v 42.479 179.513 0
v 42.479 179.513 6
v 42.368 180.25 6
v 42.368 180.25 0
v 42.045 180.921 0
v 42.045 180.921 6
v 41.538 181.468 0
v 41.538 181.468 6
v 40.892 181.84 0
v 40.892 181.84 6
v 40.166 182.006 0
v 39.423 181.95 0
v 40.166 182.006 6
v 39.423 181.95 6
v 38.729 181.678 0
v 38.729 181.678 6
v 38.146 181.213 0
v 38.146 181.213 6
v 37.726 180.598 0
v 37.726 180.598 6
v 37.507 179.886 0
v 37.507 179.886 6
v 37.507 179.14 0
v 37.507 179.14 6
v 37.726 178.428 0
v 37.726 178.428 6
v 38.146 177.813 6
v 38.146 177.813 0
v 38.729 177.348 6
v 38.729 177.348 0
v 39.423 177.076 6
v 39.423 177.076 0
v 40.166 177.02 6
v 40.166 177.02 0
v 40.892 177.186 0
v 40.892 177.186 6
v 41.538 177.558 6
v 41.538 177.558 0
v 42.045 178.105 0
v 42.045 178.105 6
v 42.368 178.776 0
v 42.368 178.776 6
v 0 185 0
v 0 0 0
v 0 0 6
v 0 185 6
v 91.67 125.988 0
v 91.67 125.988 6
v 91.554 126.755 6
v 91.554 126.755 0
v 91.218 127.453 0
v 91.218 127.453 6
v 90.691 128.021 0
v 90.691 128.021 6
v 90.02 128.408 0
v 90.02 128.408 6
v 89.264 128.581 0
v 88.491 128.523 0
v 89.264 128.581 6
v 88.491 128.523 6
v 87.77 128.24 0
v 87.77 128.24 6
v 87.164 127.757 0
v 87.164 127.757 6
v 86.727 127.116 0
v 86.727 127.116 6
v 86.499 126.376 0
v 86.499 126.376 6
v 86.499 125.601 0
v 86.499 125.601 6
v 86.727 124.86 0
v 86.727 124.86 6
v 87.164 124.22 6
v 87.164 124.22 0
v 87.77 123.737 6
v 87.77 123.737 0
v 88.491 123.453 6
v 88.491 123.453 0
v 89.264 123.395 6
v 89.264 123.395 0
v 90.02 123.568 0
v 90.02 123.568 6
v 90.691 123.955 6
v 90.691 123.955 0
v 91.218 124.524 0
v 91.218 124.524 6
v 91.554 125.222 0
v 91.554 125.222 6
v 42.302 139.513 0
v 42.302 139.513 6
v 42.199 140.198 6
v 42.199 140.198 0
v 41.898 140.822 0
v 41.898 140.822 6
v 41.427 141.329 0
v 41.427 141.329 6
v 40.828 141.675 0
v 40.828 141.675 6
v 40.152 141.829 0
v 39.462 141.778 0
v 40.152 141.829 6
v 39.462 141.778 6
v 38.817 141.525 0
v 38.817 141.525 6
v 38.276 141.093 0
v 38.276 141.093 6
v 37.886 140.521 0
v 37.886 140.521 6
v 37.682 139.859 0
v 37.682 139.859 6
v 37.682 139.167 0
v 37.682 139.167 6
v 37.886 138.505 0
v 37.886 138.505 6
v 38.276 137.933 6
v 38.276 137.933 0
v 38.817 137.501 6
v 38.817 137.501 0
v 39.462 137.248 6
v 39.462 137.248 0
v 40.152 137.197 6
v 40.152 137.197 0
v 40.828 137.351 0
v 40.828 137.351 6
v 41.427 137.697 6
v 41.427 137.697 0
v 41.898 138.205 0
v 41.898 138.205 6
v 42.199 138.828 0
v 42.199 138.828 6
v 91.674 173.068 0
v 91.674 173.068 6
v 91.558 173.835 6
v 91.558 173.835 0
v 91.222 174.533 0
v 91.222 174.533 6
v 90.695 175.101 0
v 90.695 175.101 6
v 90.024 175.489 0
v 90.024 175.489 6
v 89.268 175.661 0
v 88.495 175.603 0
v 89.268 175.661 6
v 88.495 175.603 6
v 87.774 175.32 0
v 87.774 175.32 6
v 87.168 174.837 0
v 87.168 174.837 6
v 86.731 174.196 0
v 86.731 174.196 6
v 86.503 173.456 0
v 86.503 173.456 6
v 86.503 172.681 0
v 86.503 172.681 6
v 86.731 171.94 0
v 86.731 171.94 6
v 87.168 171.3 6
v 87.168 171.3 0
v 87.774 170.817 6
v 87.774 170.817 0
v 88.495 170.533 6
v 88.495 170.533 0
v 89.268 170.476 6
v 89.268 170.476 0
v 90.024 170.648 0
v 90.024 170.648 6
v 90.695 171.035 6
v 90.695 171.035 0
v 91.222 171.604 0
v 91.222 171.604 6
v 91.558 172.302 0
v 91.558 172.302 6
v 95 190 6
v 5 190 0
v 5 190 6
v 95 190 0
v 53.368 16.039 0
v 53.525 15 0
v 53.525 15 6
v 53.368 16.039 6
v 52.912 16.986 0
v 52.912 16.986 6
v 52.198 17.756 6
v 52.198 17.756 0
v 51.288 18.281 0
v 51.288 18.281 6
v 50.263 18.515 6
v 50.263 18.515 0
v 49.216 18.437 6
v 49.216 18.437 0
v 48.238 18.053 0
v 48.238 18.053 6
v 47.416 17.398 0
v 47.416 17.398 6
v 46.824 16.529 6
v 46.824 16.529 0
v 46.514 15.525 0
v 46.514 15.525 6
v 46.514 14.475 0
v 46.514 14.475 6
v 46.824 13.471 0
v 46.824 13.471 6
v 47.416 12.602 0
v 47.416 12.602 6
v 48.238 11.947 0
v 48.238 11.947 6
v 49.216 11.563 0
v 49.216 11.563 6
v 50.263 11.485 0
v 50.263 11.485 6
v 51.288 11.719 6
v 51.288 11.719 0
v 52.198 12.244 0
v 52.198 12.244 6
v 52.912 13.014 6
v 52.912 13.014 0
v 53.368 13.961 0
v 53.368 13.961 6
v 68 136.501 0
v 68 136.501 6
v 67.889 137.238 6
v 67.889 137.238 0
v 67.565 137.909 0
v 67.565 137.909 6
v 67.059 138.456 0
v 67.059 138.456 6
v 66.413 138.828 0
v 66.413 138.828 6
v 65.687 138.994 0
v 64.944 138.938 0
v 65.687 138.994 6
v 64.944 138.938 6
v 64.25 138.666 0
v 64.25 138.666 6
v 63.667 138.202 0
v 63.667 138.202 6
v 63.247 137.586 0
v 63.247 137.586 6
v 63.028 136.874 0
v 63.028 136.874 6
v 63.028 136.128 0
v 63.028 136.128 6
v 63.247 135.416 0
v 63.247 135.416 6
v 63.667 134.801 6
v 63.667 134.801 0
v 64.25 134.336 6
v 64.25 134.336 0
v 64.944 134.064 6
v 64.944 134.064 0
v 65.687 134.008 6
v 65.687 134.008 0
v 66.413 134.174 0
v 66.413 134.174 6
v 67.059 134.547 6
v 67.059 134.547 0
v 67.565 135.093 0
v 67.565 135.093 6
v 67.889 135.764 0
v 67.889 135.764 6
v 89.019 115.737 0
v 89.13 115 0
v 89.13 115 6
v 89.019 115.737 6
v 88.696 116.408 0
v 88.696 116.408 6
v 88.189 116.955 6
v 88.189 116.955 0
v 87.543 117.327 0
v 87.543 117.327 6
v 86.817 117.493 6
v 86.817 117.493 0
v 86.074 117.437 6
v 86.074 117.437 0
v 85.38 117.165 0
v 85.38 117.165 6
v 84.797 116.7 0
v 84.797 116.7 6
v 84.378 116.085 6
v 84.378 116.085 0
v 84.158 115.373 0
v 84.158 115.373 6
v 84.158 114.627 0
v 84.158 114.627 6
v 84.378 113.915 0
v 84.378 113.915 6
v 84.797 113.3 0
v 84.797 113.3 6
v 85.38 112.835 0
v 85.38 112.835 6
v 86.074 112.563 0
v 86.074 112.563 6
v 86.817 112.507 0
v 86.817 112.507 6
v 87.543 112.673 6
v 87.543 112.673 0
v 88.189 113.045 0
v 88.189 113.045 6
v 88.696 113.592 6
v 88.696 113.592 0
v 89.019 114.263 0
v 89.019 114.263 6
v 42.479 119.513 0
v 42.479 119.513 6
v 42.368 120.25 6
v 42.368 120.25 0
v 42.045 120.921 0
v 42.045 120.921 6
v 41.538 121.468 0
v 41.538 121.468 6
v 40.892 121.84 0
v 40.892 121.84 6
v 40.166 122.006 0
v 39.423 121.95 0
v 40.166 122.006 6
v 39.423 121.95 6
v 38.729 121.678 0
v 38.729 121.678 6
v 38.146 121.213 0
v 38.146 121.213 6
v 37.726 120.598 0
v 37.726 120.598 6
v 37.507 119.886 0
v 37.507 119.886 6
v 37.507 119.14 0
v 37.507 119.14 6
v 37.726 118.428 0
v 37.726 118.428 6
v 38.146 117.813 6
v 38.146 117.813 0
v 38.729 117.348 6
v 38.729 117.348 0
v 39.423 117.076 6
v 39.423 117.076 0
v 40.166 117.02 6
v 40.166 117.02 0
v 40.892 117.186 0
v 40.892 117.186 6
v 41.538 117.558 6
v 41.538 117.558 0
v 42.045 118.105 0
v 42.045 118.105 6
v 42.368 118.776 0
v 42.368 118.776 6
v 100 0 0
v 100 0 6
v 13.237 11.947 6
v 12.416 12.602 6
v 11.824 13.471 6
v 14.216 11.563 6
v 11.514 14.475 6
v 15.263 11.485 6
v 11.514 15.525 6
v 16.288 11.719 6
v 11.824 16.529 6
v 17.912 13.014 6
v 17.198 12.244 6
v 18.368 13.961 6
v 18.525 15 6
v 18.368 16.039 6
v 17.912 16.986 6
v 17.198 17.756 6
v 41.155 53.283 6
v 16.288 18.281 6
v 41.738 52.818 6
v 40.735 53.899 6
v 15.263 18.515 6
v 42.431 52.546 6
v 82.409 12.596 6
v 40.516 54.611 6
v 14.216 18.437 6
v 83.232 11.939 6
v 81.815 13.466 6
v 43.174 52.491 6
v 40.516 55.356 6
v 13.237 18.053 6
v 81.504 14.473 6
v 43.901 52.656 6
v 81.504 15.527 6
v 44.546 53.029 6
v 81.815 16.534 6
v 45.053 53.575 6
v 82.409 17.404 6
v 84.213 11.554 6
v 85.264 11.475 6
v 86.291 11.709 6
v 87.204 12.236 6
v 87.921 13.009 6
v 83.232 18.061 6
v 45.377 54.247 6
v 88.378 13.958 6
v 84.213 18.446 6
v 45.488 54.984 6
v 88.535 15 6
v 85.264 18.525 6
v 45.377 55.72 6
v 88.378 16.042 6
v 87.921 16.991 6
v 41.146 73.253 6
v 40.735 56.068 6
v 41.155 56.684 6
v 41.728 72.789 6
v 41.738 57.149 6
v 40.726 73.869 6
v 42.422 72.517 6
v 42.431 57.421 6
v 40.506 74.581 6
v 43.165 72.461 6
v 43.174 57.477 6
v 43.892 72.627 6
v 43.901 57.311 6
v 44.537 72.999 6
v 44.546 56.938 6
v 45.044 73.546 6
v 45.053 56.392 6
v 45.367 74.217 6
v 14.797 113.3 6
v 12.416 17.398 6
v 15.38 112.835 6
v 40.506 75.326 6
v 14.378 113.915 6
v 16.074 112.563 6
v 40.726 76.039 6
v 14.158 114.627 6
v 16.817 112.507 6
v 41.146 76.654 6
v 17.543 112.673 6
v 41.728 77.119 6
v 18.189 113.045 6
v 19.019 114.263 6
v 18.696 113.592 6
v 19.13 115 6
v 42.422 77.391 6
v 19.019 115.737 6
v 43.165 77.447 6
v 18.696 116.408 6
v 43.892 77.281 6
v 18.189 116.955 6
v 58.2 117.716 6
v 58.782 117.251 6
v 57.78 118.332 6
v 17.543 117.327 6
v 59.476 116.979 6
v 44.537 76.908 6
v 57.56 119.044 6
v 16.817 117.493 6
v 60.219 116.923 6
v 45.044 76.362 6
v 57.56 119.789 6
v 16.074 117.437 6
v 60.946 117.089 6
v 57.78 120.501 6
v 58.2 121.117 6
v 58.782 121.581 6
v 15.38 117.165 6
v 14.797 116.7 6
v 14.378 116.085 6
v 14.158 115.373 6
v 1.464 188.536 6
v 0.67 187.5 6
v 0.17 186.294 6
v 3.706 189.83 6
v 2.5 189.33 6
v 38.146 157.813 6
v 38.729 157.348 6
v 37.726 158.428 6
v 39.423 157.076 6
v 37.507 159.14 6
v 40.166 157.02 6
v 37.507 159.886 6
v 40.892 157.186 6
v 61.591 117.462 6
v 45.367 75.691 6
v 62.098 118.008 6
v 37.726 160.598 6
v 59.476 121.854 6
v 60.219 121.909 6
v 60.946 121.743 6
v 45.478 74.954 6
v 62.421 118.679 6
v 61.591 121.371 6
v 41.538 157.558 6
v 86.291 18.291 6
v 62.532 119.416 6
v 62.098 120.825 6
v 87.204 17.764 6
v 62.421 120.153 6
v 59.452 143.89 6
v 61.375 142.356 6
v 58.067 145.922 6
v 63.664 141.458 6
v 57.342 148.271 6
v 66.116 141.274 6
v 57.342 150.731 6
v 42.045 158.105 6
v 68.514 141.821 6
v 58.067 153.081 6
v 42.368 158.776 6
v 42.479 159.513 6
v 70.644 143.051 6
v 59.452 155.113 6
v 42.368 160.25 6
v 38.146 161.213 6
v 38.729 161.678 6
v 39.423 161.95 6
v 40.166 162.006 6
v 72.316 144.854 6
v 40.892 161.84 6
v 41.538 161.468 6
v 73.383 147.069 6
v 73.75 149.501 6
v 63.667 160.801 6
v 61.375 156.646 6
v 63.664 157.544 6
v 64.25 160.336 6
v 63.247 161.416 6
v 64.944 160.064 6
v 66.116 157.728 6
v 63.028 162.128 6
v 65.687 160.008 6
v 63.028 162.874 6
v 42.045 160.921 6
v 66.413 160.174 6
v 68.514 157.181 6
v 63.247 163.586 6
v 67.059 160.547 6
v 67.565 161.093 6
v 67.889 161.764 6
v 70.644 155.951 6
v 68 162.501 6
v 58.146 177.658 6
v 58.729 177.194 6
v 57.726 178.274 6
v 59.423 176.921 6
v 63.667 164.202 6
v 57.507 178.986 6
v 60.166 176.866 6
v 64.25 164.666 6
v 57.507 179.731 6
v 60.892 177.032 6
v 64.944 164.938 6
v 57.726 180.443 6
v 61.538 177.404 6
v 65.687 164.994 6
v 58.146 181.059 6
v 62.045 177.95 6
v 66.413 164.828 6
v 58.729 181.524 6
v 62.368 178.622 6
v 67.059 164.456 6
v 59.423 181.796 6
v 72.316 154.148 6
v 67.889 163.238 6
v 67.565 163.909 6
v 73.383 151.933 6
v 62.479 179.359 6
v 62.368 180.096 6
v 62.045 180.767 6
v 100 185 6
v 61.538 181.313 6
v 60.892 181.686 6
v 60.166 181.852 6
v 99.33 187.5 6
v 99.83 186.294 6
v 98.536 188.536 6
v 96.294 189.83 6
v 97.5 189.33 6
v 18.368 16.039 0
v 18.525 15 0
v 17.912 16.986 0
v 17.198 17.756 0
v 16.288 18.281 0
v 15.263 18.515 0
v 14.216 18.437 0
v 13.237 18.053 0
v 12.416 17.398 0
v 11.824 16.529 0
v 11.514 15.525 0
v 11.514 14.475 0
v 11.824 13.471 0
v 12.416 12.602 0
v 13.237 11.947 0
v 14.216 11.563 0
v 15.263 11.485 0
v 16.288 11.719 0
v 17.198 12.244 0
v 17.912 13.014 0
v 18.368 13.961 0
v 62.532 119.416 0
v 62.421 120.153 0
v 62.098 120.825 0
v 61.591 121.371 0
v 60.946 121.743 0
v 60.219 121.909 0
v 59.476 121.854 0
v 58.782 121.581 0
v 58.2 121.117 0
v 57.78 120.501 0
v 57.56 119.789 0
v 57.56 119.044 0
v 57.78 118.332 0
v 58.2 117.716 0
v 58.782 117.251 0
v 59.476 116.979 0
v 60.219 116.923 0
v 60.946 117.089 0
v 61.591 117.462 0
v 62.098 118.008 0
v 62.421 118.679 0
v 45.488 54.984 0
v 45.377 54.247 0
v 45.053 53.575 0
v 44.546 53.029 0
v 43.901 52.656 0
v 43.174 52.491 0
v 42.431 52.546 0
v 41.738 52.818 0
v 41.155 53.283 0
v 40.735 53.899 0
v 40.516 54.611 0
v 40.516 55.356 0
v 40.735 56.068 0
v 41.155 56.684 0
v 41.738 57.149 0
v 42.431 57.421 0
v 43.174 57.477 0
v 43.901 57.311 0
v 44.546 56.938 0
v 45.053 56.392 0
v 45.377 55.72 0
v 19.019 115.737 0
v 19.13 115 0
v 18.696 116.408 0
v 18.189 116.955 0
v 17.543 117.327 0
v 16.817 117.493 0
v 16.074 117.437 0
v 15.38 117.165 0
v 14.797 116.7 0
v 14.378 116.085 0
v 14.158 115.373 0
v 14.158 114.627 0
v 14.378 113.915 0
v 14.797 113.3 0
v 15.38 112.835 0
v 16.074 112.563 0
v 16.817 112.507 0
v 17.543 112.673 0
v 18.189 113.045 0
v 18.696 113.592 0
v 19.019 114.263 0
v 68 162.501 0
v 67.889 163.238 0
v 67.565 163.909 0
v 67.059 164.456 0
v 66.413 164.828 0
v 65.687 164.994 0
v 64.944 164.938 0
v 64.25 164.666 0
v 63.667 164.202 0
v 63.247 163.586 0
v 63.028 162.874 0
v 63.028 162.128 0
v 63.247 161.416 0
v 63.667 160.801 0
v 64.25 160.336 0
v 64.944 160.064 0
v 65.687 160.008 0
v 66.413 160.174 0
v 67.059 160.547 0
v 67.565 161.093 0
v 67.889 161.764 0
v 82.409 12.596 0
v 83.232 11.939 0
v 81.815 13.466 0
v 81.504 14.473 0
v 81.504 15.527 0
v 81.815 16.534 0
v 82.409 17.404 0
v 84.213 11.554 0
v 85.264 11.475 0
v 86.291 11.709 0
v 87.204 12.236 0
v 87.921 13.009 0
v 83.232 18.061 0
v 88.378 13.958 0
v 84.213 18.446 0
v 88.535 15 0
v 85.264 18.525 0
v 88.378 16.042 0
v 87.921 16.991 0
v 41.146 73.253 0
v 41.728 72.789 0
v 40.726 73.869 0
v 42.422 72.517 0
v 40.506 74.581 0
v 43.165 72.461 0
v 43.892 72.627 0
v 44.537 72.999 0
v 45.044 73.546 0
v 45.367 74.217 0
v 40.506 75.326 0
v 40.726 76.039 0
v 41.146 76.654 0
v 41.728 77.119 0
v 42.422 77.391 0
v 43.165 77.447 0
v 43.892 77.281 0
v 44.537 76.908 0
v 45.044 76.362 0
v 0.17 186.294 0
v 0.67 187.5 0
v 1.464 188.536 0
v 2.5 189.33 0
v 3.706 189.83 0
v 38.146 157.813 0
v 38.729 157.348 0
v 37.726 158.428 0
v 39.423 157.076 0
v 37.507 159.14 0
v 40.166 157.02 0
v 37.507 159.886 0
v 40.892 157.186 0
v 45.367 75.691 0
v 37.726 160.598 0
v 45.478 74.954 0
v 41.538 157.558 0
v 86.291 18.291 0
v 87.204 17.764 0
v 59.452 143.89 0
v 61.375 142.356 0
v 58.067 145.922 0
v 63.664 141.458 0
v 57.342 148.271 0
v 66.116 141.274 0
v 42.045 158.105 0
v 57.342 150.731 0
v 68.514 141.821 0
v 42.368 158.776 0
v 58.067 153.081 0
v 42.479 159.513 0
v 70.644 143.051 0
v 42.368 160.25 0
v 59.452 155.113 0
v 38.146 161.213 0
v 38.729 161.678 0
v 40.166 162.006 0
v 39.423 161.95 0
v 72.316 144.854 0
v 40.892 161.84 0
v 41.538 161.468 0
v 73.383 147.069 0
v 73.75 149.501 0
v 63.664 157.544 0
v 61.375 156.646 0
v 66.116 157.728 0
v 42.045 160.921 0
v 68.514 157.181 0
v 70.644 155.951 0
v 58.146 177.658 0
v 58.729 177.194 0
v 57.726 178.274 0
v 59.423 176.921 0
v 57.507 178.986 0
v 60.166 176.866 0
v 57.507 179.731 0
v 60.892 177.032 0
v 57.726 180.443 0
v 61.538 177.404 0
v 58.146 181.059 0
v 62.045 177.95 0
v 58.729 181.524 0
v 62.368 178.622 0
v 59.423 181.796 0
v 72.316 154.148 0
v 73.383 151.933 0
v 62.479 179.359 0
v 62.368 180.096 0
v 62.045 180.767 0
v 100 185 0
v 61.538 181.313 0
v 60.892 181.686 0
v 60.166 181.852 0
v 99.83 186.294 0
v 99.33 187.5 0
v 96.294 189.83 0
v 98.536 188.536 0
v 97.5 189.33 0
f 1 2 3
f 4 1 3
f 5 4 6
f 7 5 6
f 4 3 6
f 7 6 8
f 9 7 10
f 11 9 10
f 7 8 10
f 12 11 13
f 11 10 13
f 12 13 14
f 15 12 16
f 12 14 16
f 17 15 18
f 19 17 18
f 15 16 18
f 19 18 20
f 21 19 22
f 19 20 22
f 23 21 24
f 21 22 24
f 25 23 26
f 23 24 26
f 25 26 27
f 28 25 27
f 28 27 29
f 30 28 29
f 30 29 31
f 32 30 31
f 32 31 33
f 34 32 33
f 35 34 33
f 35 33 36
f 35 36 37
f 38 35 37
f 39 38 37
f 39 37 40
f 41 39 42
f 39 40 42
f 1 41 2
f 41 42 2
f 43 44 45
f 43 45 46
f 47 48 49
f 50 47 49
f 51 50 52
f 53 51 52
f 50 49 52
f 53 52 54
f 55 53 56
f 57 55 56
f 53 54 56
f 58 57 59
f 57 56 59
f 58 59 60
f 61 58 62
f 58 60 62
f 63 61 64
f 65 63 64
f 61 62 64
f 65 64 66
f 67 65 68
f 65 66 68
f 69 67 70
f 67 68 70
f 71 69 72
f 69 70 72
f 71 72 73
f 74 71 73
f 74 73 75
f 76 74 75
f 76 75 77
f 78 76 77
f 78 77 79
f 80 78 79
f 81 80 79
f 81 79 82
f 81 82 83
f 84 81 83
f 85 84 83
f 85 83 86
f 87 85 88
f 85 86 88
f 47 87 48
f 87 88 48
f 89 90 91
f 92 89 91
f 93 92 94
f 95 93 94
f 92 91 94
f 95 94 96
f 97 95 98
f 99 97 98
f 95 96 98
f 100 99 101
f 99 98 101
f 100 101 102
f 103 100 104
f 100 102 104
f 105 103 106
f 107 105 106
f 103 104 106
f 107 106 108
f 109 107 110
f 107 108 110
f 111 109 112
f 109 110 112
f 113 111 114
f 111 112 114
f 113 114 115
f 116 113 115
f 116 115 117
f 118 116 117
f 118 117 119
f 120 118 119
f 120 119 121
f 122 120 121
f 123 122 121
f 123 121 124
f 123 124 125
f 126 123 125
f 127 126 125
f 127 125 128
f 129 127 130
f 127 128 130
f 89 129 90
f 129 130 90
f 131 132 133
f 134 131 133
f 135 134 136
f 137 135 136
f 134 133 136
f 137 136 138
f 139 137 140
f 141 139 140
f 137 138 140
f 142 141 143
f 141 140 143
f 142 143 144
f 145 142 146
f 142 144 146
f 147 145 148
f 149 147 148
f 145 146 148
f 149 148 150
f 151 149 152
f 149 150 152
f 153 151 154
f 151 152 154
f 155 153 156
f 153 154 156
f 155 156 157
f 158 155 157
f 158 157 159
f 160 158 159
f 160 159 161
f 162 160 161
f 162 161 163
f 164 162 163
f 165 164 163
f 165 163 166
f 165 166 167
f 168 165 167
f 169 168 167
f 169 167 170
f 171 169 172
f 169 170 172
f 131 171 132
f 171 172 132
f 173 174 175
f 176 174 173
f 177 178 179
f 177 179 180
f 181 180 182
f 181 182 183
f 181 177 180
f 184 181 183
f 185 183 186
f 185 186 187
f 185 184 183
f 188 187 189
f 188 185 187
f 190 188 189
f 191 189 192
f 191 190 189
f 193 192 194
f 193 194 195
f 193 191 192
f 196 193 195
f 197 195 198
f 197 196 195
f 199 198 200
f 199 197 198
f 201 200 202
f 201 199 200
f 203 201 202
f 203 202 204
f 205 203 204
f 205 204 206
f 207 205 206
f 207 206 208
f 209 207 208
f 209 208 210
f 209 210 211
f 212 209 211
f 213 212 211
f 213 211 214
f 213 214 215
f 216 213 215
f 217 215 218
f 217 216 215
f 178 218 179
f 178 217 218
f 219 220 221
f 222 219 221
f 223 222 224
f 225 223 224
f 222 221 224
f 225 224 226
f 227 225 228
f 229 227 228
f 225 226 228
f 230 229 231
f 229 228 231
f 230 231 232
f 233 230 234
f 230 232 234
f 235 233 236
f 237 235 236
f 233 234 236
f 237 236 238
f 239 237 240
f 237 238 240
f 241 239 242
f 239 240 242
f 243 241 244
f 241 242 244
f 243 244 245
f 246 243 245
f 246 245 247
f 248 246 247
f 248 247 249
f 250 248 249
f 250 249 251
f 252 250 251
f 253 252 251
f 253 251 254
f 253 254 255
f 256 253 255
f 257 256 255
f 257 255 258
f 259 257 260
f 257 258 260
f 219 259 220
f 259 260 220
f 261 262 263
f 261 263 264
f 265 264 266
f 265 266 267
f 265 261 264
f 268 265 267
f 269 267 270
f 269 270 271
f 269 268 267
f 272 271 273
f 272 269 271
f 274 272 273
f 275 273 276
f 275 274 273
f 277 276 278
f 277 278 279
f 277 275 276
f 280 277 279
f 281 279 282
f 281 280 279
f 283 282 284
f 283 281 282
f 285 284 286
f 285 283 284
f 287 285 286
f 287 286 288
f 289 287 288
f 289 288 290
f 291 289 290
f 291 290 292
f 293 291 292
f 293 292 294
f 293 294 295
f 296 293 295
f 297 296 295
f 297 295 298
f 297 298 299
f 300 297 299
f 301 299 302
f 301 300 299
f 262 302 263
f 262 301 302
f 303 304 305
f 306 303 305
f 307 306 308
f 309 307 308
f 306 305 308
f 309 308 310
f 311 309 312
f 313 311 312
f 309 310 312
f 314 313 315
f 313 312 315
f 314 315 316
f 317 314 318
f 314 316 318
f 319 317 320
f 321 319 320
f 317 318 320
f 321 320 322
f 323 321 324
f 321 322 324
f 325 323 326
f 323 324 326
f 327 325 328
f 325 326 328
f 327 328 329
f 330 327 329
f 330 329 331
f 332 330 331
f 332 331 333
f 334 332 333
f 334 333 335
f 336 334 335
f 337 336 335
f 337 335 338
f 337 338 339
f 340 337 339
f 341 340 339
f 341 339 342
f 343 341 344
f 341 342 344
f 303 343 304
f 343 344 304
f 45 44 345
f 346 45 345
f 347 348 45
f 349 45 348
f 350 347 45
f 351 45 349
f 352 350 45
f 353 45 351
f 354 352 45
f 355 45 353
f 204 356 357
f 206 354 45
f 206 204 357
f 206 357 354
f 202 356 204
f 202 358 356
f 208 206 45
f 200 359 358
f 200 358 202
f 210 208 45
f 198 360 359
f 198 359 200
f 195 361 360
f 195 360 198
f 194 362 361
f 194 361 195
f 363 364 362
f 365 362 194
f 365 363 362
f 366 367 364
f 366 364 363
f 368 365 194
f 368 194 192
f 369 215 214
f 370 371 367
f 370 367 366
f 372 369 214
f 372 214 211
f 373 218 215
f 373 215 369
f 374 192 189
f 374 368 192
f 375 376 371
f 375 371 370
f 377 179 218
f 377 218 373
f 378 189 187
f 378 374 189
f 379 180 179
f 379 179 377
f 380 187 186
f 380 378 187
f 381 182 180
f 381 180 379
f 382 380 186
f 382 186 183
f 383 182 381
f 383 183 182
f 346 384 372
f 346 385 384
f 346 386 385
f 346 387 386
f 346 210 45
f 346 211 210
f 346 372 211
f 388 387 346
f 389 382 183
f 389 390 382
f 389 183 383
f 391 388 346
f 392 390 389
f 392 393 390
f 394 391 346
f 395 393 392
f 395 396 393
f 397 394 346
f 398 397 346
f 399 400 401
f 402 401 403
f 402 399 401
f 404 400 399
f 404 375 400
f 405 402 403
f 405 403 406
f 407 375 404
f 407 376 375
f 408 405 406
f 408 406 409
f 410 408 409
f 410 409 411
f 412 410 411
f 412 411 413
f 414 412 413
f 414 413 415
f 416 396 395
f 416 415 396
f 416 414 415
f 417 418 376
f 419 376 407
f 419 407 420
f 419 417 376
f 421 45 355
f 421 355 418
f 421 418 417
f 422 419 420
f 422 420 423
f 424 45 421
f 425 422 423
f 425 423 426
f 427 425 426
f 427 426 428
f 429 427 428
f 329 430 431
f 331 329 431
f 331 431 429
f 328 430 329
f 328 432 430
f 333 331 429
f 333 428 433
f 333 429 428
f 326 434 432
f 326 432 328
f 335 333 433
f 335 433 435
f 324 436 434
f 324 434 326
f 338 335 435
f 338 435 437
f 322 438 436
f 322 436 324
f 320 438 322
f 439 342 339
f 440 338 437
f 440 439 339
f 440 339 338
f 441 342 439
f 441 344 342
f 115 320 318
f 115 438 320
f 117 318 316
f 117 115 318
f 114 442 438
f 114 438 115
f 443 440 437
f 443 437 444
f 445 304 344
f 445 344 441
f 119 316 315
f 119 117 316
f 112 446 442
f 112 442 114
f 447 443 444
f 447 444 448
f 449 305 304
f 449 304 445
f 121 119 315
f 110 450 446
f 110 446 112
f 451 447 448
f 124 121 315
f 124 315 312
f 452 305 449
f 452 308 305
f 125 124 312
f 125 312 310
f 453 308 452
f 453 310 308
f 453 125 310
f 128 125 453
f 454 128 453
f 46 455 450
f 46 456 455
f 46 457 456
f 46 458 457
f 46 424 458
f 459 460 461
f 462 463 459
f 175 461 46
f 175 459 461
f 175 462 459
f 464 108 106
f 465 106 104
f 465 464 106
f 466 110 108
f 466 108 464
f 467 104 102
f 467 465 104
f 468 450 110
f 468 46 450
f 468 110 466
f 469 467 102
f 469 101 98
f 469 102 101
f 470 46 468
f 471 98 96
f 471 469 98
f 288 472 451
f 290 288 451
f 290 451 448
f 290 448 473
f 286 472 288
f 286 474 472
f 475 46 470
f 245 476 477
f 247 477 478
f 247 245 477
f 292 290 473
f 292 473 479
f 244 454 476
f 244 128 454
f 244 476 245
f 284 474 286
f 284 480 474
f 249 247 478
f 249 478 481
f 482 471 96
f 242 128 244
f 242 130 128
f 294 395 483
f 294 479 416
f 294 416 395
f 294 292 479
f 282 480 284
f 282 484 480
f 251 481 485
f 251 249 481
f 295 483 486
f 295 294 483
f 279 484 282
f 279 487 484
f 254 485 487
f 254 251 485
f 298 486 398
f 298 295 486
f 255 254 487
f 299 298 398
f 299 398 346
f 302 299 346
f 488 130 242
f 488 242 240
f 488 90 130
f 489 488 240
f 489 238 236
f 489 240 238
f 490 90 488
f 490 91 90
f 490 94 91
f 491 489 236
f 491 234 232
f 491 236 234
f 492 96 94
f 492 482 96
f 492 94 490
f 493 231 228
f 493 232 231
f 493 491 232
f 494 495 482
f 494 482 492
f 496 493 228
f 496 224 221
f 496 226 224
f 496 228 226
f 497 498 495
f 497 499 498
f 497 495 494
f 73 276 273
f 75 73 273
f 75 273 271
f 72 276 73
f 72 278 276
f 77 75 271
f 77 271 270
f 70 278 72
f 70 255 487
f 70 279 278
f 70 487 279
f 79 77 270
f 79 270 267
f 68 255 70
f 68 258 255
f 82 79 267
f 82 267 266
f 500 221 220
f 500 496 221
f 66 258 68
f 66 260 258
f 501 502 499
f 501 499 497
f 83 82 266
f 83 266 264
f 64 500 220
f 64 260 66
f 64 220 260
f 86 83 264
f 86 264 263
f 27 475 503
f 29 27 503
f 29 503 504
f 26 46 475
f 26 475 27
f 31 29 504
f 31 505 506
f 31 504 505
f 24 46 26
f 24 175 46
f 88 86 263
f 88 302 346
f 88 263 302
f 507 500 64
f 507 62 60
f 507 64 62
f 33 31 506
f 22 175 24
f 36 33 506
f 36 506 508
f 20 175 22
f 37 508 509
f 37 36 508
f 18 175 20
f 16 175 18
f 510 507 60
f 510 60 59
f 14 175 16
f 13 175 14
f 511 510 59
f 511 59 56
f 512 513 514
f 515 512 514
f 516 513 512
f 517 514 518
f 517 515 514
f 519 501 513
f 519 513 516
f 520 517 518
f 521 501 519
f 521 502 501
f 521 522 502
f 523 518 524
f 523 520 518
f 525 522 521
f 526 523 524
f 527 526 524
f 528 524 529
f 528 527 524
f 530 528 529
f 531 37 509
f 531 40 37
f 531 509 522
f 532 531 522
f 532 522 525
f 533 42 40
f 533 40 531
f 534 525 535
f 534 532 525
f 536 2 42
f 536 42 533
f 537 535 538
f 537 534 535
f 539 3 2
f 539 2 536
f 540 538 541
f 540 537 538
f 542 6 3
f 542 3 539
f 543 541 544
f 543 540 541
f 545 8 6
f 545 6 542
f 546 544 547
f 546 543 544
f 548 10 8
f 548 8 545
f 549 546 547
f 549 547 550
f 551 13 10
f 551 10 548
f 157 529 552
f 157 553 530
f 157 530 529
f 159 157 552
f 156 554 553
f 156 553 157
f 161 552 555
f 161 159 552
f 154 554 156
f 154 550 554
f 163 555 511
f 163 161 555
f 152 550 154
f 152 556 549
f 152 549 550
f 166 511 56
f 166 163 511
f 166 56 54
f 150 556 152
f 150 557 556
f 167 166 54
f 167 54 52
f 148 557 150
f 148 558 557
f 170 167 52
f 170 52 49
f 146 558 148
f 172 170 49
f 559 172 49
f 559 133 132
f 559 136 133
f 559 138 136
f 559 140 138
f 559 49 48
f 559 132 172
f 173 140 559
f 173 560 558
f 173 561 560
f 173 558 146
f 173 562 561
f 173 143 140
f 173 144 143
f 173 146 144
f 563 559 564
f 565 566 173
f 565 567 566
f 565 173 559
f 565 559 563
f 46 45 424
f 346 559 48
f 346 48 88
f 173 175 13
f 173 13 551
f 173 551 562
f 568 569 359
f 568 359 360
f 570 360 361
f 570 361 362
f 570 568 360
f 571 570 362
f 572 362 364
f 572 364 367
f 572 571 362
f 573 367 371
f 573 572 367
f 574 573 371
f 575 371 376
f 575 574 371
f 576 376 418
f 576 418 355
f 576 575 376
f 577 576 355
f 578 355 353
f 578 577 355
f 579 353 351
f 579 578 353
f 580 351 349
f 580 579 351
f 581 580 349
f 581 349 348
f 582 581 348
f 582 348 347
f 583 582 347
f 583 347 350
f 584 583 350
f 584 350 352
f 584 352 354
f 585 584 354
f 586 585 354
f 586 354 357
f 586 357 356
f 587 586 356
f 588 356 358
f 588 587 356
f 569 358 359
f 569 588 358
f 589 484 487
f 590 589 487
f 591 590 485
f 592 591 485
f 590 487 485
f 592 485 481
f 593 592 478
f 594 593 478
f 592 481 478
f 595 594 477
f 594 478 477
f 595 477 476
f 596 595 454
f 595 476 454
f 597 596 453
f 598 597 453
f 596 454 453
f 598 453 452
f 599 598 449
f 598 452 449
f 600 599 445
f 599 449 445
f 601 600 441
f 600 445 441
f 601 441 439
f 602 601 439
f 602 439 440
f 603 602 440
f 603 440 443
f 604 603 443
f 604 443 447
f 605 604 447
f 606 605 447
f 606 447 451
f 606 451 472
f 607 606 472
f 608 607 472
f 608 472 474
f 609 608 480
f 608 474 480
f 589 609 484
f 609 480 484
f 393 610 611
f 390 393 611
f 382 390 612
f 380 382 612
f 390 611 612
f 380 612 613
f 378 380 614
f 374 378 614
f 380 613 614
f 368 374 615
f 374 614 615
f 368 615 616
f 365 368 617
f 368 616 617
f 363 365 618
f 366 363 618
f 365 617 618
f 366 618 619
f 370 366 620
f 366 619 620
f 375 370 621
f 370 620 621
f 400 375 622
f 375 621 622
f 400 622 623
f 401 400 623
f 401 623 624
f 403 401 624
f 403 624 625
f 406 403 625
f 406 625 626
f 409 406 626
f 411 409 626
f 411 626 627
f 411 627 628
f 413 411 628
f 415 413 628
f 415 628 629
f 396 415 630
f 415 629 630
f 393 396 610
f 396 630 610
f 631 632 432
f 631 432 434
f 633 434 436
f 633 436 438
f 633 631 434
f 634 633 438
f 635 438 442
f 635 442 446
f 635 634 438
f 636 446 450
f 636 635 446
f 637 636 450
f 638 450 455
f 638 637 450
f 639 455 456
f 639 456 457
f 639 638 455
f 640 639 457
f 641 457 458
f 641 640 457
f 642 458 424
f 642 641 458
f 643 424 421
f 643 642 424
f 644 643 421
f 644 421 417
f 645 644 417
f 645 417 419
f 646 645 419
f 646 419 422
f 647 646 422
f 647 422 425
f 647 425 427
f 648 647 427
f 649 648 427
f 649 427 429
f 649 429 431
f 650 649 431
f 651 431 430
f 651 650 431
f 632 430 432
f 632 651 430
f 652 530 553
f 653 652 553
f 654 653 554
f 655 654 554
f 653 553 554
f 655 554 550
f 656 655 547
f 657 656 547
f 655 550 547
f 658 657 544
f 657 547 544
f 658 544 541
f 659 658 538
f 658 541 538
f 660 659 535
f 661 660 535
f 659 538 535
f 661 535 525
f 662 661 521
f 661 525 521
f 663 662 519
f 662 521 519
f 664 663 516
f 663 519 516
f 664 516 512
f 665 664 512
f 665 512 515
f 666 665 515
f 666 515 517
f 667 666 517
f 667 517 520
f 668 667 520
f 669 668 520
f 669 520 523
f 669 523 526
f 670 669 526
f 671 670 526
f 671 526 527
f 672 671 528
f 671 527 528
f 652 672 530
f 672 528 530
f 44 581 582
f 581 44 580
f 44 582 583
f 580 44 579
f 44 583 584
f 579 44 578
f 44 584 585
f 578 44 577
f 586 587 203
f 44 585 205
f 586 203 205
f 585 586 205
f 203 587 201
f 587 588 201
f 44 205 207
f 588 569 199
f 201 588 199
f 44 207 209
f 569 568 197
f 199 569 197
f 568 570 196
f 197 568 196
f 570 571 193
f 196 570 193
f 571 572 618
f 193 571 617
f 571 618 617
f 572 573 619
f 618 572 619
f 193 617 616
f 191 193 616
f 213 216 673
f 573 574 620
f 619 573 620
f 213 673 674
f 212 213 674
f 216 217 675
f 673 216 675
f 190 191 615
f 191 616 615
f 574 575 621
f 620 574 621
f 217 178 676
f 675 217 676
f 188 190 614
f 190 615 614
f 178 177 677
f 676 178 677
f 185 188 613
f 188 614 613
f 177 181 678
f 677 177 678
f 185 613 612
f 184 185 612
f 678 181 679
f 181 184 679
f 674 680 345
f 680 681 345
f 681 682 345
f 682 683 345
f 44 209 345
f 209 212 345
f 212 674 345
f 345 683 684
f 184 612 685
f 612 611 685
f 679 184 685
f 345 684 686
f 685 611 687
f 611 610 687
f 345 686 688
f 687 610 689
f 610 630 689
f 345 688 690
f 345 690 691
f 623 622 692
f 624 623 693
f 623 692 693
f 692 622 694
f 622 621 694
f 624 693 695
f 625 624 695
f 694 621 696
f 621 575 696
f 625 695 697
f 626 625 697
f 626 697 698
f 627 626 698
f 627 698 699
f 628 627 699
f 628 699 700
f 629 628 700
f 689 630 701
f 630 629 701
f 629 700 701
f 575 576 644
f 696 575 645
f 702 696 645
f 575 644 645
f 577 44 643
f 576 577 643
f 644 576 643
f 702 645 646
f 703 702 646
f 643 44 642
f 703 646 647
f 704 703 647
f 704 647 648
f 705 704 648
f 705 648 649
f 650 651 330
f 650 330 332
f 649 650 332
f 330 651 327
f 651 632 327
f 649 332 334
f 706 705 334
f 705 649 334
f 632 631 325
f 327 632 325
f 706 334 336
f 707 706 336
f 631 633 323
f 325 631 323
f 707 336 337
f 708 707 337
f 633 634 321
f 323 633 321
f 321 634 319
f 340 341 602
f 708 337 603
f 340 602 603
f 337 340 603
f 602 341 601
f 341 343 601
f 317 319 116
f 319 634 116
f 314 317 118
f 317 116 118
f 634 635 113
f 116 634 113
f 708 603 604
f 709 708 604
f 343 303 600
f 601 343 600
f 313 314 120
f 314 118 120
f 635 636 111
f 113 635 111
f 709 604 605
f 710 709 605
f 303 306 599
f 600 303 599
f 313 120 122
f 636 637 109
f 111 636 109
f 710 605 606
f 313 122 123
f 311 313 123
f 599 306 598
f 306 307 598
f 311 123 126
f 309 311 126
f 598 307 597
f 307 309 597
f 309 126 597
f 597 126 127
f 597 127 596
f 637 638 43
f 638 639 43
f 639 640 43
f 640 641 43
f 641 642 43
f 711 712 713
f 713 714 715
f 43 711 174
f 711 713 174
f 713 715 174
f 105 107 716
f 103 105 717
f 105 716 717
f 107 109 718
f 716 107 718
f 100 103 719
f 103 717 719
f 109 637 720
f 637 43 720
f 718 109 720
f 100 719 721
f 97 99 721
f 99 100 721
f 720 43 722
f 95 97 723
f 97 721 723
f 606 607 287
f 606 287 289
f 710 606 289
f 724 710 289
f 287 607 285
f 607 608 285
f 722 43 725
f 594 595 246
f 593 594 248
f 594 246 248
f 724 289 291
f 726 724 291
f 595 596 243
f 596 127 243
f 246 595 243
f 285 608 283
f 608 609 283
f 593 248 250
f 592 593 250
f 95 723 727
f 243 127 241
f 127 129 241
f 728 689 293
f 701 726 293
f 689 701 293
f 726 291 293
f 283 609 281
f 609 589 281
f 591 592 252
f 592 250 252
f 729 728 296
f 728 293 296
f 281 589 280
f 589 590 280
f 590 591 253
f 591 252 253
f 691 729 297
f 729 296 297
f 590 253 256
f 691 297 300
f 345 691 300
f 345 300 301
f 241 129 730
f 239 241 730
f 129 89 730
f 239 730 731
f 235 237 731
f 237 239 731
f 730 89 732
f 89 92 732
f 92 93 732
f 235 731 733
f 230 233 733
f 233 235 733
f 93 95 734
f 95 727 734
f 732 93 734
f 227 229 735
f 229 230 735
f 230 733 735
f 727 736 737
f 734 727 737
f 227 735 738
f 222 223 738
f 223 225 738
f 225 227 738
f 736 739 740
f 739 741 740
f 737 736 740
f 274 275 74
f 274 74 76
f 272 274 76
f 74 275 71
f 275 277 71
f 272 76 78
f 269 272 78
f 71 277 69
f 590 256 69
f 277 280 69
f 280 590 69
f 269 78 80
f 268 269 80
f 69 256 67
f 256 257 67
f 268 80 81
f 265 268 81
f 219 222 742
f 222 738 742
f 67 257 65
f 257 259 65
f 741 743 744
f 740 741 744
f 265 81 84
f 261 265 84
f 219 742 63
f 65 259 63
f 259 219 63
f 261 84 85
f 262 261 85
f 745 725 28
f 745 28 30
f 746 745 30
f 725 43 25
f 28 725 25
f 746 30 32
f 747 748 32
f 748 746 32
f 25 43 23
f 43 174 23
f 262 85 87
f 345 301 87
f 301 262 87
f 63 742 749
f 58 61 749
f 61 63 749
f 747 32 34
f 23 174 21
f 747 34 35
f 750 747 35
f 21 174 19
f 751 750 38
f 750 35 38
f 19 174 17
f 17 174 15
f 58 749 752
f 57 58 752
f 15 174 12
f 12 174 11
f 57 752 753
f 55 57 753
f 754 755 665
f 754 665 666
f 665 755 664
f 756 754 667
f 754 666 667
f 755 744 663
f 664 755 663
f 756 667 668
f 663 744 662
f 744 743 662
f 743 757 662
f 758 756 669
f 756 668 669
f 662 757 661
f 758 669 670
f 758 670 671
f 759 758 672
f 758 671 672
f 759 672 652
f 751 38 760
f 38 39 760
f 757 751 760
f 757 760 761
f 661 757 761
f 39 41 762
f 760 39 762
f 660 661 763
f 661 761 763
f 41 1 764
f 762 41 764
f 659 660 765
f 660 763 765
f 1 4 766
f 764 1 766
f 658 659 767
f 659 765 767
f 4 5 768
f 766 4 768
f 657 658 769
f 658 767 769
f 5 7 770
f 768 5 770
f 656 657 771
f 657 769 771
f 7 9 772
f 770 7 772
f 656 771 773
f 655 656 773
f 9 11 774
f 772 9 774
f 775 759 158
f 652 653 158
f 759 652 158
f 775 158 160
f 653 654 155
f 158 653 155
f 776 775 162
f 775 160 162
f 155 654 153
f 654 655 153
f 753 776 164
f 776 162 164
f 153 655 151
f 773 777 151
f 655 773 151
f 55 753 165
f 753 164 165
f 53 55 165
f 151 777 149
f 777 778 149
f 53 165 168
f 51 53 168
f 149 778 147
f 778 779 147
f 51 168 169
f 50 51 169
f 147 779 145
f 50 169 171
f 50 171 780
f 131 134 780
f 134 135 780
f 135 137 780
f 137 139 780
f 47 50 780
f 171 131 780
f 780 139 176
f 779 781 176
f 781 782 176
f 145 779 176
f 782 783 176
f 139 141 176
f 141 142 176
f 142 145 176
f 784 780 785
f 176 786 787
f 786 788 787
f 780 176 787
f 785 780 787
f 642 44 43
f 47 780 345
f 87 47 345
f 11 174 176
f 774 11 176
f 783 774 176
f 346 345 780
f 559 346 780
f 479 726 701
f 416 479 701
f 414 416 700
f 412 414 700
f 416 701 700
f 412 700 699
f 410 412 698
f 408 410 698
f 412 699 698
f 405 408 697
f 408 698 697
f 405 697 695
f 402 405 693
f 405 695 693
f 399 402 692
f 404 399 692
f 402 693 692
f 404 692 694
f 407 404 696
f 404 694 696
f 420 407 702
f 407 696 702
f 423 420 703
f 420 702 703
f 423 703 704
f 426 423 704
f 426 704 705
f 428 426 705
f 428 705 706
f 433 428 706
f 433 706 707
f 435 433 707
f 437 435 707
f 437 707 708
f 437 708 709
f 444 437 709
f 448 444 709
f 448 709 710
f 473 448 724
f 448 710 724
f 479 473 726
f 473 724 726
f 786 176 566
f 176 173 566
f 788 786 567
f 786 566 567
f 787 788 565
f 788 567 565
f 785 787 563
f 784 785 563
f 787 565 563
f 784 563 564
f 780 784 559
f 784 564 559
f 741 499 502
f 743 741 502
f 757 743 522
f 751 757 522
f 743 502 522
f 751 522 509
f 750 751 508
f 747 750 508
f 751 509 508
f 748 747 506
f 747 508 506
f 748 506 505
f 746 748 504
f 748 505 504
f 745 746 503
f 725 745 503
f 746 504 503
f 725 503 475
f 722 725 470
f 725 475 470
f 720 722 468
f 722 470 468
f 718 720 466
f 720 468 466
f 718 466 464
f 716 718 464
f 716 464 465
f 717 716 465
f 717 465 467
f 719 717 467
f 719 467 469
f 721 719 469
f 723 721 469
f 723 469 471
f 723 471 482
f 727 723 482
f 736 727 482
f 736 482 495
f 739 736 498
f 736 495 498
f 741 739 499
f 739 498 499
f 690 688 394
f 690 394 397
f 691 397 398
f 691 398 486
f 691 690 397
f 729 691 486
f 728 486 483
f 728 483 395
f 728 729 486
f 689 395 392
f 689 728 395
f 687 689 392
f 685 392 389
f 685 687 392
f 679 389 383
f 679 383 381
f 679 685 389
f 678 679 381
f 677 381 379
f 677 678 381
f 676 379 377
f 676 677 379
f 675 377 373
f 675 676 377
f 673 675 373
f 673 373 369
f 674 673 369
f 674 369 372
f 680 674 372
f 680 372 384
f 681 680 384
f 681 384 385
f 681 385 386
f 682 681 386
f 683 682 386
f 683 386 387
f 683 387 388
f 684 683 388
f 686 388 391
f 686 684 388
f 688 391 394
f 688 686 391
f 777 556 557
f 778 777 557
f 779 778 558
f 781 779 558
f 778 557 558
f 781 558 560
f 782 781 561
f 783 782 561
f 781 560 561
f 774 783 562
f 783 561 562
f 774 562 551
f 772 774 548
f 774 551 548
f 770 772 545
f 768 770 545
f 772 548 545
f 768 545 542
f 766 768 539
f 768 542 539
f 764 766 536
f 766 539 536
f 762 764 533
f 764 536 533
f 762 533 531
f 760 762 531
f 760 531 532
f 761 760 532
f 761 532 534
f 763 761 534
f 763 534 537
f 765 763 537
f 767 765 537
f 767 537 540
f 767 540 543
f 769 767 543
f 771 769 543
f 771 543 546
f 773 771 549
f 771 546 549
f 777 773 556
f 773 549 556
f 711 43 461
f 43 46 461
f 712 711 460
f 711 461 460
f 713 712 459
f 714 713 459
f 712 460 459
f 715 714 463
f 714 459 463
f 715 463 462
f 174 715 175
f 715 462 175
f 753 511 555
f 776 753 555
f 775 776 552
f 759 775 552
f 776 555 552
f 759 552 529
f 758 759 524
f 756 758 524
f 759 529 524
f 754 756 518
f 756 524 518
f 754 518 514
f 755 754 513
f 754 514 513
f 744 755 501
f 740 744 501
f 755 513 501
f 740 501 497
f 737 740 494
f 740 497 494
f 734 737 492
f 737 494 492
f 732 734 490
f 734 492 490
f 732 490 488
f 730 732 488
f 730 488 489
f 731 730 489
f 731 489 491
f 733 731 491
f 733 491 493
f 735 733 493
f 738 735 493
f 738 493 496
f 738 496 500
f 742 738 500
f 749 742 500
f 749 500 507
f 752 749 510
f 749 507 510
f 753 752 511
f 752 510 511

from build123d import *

# Parameters (mm, degrees)
SKETCH_1_W      = 100
SKETCH_1_H      = 190
SKETCH_1_R      = 3.525
SKETCH_1_R_2    = 3.535
SKETCH_1_R_3    = 2.5
PAD_DEPTH       = 6
SKETCH_R        = 2.5
SKETCH_R_2      = 2.322826
POCKET_DEPTH    = 6
SKETCH002_R     = 2.5
POCKET001_DEPTH = 6
SKETCH003_R     = 5
POCKET002_DEPTH = 6
SKETCH004_R     = 2.6
POCKET003_DEPTH = 6
FILLET_R        = 5
SKETCH005_R     = 8.25
POCKET004_DEPTH = 6
SKETCH006_R     = 2.5
POCKET005_DEPTH = 6


with BuildPart() as part:
    # Sketch_1 → Pad (new body)
    with BuildSketch(Plane.XY):
        with Locations((50, 95)):
            Rectangle(SKETCH_1_W, SKETCH_1_H)
        with Locations((15, 15)):
            Circle(SKETCH_1_R, mode=Mode.SUBTRACT)
        with Locations((50, 15)):
            Circle(SKETCH_1_R, mode=Mode.SUBTRACT)
        with Locations((85, 15)):
            Circle(SKETCH_1_R_2, mode=Mode.SUBTRACT)
        with Locations((16.629946, 115)):
            Circle(SKETCH_1_R_3, mode=Mode.SUBTRACT)
        with Locations((86.629946, 115)):
            Circle(SKETCH_1_R_3, mode=Mode.SUBTRACT)
    extrude(amount=PAD_DEPTH)

    # Sketch (on Face11 of Pad) → Pocket (cut)
    with BuildSketch(Plane.XY.offset(6)):
        with Locations((39.978905, 119.513016)):
            Circle(SKETCH_R)
        with Locations((60.032207, 119.416237)):
            Circle(SKETCH_R)
        with Locations((39.978905, 139.513016)):
            Circle(SKETCH_R_2)
        with Locations((39.978905, 159.513016)):
            Circle(SKETCH_R)
        with Locations((39.978905, 179.513016)):
            Circle(SKETCH_R)
        with Locations((59.978905, 179.358719)):
            Circle(SKETCH_R)
    extrude(amount=-POCKET_DEPTH, mode=Mode.SUBTRACT)

    # Sketch002 (on Face4 of Pocket) → Pocket001 (cut)
    with BuildSketch(Plane(origin=(0, 0, 0), x_dir=(1, 0, 0), z_dir=(0, 0, -1))):
        with Locations((42.987591, -54.983551)):
            Circle(SKETCH002_R)
        with Locations((42.978264, -74.953857)):
            Circle(SKETCH002_R)
    extrude(amount=-POCKET001_DEPTH, mode=Mode.SUBTRACT)

    # Sketch003 (on Face5 of Pocket001) → Pocket002 (cut)
    with BuildSketch(Plane.XY.offset(6)):
        with Locations((65.499825, 149.501081)):
            Circle(SKETCH003_R)
    extrude(amount=-POCKET002_DEPTH, mode=Mode.SUBTRACT)

    # Sketch004 (on Face5 of Pocket002) → Pocket003 (cut)
    with BuildSketch(Plane.XY.offset(6)):
        with Locations((89.073647, 173.068237)):
            Circle(SKETCH004_R)
        with Locations((89.069992, 125.98822)):
            Circle(SKETCH004_R)
    extrude(amount=-POCKET003_DEPTH, mode=Mode.SUBTRACT)

    # Fillet
    fillet_edges = [part.edges().sort_by_distance(p)[0] for p in [
        (0, 190, 3),
        (100, 190, 3),
    ]]
    fillet(fillet_edges, radius=FILLET_R)

    # Sketch005 (on Face5 of Fillet) → Pocket004 (cut)
    with BuildSketch(Plane.XY.offset(6)):
        with Locations((65.499825, 149.501081)):
            Circle(SKETCH005_R)
    extrude(amount=-POCKET004_DEPTH, mode=Mode.SUBTRACT)

    # Sketch006 (on Face5 of Pocket004) → Pocket005 (cut)
    with BuildSketch(Plane.XY.offset(6)):
        with Locations((65.499825, 162.501081)):
            Circle(SKETCH006_R)
        with Locations((65.499825, 136.501081)):
            Circle(SKETCH006_R)
    extrude(amount=-POCKET005_DEPTH, mode=Mode.SUBTRACT)


solid = part.part
